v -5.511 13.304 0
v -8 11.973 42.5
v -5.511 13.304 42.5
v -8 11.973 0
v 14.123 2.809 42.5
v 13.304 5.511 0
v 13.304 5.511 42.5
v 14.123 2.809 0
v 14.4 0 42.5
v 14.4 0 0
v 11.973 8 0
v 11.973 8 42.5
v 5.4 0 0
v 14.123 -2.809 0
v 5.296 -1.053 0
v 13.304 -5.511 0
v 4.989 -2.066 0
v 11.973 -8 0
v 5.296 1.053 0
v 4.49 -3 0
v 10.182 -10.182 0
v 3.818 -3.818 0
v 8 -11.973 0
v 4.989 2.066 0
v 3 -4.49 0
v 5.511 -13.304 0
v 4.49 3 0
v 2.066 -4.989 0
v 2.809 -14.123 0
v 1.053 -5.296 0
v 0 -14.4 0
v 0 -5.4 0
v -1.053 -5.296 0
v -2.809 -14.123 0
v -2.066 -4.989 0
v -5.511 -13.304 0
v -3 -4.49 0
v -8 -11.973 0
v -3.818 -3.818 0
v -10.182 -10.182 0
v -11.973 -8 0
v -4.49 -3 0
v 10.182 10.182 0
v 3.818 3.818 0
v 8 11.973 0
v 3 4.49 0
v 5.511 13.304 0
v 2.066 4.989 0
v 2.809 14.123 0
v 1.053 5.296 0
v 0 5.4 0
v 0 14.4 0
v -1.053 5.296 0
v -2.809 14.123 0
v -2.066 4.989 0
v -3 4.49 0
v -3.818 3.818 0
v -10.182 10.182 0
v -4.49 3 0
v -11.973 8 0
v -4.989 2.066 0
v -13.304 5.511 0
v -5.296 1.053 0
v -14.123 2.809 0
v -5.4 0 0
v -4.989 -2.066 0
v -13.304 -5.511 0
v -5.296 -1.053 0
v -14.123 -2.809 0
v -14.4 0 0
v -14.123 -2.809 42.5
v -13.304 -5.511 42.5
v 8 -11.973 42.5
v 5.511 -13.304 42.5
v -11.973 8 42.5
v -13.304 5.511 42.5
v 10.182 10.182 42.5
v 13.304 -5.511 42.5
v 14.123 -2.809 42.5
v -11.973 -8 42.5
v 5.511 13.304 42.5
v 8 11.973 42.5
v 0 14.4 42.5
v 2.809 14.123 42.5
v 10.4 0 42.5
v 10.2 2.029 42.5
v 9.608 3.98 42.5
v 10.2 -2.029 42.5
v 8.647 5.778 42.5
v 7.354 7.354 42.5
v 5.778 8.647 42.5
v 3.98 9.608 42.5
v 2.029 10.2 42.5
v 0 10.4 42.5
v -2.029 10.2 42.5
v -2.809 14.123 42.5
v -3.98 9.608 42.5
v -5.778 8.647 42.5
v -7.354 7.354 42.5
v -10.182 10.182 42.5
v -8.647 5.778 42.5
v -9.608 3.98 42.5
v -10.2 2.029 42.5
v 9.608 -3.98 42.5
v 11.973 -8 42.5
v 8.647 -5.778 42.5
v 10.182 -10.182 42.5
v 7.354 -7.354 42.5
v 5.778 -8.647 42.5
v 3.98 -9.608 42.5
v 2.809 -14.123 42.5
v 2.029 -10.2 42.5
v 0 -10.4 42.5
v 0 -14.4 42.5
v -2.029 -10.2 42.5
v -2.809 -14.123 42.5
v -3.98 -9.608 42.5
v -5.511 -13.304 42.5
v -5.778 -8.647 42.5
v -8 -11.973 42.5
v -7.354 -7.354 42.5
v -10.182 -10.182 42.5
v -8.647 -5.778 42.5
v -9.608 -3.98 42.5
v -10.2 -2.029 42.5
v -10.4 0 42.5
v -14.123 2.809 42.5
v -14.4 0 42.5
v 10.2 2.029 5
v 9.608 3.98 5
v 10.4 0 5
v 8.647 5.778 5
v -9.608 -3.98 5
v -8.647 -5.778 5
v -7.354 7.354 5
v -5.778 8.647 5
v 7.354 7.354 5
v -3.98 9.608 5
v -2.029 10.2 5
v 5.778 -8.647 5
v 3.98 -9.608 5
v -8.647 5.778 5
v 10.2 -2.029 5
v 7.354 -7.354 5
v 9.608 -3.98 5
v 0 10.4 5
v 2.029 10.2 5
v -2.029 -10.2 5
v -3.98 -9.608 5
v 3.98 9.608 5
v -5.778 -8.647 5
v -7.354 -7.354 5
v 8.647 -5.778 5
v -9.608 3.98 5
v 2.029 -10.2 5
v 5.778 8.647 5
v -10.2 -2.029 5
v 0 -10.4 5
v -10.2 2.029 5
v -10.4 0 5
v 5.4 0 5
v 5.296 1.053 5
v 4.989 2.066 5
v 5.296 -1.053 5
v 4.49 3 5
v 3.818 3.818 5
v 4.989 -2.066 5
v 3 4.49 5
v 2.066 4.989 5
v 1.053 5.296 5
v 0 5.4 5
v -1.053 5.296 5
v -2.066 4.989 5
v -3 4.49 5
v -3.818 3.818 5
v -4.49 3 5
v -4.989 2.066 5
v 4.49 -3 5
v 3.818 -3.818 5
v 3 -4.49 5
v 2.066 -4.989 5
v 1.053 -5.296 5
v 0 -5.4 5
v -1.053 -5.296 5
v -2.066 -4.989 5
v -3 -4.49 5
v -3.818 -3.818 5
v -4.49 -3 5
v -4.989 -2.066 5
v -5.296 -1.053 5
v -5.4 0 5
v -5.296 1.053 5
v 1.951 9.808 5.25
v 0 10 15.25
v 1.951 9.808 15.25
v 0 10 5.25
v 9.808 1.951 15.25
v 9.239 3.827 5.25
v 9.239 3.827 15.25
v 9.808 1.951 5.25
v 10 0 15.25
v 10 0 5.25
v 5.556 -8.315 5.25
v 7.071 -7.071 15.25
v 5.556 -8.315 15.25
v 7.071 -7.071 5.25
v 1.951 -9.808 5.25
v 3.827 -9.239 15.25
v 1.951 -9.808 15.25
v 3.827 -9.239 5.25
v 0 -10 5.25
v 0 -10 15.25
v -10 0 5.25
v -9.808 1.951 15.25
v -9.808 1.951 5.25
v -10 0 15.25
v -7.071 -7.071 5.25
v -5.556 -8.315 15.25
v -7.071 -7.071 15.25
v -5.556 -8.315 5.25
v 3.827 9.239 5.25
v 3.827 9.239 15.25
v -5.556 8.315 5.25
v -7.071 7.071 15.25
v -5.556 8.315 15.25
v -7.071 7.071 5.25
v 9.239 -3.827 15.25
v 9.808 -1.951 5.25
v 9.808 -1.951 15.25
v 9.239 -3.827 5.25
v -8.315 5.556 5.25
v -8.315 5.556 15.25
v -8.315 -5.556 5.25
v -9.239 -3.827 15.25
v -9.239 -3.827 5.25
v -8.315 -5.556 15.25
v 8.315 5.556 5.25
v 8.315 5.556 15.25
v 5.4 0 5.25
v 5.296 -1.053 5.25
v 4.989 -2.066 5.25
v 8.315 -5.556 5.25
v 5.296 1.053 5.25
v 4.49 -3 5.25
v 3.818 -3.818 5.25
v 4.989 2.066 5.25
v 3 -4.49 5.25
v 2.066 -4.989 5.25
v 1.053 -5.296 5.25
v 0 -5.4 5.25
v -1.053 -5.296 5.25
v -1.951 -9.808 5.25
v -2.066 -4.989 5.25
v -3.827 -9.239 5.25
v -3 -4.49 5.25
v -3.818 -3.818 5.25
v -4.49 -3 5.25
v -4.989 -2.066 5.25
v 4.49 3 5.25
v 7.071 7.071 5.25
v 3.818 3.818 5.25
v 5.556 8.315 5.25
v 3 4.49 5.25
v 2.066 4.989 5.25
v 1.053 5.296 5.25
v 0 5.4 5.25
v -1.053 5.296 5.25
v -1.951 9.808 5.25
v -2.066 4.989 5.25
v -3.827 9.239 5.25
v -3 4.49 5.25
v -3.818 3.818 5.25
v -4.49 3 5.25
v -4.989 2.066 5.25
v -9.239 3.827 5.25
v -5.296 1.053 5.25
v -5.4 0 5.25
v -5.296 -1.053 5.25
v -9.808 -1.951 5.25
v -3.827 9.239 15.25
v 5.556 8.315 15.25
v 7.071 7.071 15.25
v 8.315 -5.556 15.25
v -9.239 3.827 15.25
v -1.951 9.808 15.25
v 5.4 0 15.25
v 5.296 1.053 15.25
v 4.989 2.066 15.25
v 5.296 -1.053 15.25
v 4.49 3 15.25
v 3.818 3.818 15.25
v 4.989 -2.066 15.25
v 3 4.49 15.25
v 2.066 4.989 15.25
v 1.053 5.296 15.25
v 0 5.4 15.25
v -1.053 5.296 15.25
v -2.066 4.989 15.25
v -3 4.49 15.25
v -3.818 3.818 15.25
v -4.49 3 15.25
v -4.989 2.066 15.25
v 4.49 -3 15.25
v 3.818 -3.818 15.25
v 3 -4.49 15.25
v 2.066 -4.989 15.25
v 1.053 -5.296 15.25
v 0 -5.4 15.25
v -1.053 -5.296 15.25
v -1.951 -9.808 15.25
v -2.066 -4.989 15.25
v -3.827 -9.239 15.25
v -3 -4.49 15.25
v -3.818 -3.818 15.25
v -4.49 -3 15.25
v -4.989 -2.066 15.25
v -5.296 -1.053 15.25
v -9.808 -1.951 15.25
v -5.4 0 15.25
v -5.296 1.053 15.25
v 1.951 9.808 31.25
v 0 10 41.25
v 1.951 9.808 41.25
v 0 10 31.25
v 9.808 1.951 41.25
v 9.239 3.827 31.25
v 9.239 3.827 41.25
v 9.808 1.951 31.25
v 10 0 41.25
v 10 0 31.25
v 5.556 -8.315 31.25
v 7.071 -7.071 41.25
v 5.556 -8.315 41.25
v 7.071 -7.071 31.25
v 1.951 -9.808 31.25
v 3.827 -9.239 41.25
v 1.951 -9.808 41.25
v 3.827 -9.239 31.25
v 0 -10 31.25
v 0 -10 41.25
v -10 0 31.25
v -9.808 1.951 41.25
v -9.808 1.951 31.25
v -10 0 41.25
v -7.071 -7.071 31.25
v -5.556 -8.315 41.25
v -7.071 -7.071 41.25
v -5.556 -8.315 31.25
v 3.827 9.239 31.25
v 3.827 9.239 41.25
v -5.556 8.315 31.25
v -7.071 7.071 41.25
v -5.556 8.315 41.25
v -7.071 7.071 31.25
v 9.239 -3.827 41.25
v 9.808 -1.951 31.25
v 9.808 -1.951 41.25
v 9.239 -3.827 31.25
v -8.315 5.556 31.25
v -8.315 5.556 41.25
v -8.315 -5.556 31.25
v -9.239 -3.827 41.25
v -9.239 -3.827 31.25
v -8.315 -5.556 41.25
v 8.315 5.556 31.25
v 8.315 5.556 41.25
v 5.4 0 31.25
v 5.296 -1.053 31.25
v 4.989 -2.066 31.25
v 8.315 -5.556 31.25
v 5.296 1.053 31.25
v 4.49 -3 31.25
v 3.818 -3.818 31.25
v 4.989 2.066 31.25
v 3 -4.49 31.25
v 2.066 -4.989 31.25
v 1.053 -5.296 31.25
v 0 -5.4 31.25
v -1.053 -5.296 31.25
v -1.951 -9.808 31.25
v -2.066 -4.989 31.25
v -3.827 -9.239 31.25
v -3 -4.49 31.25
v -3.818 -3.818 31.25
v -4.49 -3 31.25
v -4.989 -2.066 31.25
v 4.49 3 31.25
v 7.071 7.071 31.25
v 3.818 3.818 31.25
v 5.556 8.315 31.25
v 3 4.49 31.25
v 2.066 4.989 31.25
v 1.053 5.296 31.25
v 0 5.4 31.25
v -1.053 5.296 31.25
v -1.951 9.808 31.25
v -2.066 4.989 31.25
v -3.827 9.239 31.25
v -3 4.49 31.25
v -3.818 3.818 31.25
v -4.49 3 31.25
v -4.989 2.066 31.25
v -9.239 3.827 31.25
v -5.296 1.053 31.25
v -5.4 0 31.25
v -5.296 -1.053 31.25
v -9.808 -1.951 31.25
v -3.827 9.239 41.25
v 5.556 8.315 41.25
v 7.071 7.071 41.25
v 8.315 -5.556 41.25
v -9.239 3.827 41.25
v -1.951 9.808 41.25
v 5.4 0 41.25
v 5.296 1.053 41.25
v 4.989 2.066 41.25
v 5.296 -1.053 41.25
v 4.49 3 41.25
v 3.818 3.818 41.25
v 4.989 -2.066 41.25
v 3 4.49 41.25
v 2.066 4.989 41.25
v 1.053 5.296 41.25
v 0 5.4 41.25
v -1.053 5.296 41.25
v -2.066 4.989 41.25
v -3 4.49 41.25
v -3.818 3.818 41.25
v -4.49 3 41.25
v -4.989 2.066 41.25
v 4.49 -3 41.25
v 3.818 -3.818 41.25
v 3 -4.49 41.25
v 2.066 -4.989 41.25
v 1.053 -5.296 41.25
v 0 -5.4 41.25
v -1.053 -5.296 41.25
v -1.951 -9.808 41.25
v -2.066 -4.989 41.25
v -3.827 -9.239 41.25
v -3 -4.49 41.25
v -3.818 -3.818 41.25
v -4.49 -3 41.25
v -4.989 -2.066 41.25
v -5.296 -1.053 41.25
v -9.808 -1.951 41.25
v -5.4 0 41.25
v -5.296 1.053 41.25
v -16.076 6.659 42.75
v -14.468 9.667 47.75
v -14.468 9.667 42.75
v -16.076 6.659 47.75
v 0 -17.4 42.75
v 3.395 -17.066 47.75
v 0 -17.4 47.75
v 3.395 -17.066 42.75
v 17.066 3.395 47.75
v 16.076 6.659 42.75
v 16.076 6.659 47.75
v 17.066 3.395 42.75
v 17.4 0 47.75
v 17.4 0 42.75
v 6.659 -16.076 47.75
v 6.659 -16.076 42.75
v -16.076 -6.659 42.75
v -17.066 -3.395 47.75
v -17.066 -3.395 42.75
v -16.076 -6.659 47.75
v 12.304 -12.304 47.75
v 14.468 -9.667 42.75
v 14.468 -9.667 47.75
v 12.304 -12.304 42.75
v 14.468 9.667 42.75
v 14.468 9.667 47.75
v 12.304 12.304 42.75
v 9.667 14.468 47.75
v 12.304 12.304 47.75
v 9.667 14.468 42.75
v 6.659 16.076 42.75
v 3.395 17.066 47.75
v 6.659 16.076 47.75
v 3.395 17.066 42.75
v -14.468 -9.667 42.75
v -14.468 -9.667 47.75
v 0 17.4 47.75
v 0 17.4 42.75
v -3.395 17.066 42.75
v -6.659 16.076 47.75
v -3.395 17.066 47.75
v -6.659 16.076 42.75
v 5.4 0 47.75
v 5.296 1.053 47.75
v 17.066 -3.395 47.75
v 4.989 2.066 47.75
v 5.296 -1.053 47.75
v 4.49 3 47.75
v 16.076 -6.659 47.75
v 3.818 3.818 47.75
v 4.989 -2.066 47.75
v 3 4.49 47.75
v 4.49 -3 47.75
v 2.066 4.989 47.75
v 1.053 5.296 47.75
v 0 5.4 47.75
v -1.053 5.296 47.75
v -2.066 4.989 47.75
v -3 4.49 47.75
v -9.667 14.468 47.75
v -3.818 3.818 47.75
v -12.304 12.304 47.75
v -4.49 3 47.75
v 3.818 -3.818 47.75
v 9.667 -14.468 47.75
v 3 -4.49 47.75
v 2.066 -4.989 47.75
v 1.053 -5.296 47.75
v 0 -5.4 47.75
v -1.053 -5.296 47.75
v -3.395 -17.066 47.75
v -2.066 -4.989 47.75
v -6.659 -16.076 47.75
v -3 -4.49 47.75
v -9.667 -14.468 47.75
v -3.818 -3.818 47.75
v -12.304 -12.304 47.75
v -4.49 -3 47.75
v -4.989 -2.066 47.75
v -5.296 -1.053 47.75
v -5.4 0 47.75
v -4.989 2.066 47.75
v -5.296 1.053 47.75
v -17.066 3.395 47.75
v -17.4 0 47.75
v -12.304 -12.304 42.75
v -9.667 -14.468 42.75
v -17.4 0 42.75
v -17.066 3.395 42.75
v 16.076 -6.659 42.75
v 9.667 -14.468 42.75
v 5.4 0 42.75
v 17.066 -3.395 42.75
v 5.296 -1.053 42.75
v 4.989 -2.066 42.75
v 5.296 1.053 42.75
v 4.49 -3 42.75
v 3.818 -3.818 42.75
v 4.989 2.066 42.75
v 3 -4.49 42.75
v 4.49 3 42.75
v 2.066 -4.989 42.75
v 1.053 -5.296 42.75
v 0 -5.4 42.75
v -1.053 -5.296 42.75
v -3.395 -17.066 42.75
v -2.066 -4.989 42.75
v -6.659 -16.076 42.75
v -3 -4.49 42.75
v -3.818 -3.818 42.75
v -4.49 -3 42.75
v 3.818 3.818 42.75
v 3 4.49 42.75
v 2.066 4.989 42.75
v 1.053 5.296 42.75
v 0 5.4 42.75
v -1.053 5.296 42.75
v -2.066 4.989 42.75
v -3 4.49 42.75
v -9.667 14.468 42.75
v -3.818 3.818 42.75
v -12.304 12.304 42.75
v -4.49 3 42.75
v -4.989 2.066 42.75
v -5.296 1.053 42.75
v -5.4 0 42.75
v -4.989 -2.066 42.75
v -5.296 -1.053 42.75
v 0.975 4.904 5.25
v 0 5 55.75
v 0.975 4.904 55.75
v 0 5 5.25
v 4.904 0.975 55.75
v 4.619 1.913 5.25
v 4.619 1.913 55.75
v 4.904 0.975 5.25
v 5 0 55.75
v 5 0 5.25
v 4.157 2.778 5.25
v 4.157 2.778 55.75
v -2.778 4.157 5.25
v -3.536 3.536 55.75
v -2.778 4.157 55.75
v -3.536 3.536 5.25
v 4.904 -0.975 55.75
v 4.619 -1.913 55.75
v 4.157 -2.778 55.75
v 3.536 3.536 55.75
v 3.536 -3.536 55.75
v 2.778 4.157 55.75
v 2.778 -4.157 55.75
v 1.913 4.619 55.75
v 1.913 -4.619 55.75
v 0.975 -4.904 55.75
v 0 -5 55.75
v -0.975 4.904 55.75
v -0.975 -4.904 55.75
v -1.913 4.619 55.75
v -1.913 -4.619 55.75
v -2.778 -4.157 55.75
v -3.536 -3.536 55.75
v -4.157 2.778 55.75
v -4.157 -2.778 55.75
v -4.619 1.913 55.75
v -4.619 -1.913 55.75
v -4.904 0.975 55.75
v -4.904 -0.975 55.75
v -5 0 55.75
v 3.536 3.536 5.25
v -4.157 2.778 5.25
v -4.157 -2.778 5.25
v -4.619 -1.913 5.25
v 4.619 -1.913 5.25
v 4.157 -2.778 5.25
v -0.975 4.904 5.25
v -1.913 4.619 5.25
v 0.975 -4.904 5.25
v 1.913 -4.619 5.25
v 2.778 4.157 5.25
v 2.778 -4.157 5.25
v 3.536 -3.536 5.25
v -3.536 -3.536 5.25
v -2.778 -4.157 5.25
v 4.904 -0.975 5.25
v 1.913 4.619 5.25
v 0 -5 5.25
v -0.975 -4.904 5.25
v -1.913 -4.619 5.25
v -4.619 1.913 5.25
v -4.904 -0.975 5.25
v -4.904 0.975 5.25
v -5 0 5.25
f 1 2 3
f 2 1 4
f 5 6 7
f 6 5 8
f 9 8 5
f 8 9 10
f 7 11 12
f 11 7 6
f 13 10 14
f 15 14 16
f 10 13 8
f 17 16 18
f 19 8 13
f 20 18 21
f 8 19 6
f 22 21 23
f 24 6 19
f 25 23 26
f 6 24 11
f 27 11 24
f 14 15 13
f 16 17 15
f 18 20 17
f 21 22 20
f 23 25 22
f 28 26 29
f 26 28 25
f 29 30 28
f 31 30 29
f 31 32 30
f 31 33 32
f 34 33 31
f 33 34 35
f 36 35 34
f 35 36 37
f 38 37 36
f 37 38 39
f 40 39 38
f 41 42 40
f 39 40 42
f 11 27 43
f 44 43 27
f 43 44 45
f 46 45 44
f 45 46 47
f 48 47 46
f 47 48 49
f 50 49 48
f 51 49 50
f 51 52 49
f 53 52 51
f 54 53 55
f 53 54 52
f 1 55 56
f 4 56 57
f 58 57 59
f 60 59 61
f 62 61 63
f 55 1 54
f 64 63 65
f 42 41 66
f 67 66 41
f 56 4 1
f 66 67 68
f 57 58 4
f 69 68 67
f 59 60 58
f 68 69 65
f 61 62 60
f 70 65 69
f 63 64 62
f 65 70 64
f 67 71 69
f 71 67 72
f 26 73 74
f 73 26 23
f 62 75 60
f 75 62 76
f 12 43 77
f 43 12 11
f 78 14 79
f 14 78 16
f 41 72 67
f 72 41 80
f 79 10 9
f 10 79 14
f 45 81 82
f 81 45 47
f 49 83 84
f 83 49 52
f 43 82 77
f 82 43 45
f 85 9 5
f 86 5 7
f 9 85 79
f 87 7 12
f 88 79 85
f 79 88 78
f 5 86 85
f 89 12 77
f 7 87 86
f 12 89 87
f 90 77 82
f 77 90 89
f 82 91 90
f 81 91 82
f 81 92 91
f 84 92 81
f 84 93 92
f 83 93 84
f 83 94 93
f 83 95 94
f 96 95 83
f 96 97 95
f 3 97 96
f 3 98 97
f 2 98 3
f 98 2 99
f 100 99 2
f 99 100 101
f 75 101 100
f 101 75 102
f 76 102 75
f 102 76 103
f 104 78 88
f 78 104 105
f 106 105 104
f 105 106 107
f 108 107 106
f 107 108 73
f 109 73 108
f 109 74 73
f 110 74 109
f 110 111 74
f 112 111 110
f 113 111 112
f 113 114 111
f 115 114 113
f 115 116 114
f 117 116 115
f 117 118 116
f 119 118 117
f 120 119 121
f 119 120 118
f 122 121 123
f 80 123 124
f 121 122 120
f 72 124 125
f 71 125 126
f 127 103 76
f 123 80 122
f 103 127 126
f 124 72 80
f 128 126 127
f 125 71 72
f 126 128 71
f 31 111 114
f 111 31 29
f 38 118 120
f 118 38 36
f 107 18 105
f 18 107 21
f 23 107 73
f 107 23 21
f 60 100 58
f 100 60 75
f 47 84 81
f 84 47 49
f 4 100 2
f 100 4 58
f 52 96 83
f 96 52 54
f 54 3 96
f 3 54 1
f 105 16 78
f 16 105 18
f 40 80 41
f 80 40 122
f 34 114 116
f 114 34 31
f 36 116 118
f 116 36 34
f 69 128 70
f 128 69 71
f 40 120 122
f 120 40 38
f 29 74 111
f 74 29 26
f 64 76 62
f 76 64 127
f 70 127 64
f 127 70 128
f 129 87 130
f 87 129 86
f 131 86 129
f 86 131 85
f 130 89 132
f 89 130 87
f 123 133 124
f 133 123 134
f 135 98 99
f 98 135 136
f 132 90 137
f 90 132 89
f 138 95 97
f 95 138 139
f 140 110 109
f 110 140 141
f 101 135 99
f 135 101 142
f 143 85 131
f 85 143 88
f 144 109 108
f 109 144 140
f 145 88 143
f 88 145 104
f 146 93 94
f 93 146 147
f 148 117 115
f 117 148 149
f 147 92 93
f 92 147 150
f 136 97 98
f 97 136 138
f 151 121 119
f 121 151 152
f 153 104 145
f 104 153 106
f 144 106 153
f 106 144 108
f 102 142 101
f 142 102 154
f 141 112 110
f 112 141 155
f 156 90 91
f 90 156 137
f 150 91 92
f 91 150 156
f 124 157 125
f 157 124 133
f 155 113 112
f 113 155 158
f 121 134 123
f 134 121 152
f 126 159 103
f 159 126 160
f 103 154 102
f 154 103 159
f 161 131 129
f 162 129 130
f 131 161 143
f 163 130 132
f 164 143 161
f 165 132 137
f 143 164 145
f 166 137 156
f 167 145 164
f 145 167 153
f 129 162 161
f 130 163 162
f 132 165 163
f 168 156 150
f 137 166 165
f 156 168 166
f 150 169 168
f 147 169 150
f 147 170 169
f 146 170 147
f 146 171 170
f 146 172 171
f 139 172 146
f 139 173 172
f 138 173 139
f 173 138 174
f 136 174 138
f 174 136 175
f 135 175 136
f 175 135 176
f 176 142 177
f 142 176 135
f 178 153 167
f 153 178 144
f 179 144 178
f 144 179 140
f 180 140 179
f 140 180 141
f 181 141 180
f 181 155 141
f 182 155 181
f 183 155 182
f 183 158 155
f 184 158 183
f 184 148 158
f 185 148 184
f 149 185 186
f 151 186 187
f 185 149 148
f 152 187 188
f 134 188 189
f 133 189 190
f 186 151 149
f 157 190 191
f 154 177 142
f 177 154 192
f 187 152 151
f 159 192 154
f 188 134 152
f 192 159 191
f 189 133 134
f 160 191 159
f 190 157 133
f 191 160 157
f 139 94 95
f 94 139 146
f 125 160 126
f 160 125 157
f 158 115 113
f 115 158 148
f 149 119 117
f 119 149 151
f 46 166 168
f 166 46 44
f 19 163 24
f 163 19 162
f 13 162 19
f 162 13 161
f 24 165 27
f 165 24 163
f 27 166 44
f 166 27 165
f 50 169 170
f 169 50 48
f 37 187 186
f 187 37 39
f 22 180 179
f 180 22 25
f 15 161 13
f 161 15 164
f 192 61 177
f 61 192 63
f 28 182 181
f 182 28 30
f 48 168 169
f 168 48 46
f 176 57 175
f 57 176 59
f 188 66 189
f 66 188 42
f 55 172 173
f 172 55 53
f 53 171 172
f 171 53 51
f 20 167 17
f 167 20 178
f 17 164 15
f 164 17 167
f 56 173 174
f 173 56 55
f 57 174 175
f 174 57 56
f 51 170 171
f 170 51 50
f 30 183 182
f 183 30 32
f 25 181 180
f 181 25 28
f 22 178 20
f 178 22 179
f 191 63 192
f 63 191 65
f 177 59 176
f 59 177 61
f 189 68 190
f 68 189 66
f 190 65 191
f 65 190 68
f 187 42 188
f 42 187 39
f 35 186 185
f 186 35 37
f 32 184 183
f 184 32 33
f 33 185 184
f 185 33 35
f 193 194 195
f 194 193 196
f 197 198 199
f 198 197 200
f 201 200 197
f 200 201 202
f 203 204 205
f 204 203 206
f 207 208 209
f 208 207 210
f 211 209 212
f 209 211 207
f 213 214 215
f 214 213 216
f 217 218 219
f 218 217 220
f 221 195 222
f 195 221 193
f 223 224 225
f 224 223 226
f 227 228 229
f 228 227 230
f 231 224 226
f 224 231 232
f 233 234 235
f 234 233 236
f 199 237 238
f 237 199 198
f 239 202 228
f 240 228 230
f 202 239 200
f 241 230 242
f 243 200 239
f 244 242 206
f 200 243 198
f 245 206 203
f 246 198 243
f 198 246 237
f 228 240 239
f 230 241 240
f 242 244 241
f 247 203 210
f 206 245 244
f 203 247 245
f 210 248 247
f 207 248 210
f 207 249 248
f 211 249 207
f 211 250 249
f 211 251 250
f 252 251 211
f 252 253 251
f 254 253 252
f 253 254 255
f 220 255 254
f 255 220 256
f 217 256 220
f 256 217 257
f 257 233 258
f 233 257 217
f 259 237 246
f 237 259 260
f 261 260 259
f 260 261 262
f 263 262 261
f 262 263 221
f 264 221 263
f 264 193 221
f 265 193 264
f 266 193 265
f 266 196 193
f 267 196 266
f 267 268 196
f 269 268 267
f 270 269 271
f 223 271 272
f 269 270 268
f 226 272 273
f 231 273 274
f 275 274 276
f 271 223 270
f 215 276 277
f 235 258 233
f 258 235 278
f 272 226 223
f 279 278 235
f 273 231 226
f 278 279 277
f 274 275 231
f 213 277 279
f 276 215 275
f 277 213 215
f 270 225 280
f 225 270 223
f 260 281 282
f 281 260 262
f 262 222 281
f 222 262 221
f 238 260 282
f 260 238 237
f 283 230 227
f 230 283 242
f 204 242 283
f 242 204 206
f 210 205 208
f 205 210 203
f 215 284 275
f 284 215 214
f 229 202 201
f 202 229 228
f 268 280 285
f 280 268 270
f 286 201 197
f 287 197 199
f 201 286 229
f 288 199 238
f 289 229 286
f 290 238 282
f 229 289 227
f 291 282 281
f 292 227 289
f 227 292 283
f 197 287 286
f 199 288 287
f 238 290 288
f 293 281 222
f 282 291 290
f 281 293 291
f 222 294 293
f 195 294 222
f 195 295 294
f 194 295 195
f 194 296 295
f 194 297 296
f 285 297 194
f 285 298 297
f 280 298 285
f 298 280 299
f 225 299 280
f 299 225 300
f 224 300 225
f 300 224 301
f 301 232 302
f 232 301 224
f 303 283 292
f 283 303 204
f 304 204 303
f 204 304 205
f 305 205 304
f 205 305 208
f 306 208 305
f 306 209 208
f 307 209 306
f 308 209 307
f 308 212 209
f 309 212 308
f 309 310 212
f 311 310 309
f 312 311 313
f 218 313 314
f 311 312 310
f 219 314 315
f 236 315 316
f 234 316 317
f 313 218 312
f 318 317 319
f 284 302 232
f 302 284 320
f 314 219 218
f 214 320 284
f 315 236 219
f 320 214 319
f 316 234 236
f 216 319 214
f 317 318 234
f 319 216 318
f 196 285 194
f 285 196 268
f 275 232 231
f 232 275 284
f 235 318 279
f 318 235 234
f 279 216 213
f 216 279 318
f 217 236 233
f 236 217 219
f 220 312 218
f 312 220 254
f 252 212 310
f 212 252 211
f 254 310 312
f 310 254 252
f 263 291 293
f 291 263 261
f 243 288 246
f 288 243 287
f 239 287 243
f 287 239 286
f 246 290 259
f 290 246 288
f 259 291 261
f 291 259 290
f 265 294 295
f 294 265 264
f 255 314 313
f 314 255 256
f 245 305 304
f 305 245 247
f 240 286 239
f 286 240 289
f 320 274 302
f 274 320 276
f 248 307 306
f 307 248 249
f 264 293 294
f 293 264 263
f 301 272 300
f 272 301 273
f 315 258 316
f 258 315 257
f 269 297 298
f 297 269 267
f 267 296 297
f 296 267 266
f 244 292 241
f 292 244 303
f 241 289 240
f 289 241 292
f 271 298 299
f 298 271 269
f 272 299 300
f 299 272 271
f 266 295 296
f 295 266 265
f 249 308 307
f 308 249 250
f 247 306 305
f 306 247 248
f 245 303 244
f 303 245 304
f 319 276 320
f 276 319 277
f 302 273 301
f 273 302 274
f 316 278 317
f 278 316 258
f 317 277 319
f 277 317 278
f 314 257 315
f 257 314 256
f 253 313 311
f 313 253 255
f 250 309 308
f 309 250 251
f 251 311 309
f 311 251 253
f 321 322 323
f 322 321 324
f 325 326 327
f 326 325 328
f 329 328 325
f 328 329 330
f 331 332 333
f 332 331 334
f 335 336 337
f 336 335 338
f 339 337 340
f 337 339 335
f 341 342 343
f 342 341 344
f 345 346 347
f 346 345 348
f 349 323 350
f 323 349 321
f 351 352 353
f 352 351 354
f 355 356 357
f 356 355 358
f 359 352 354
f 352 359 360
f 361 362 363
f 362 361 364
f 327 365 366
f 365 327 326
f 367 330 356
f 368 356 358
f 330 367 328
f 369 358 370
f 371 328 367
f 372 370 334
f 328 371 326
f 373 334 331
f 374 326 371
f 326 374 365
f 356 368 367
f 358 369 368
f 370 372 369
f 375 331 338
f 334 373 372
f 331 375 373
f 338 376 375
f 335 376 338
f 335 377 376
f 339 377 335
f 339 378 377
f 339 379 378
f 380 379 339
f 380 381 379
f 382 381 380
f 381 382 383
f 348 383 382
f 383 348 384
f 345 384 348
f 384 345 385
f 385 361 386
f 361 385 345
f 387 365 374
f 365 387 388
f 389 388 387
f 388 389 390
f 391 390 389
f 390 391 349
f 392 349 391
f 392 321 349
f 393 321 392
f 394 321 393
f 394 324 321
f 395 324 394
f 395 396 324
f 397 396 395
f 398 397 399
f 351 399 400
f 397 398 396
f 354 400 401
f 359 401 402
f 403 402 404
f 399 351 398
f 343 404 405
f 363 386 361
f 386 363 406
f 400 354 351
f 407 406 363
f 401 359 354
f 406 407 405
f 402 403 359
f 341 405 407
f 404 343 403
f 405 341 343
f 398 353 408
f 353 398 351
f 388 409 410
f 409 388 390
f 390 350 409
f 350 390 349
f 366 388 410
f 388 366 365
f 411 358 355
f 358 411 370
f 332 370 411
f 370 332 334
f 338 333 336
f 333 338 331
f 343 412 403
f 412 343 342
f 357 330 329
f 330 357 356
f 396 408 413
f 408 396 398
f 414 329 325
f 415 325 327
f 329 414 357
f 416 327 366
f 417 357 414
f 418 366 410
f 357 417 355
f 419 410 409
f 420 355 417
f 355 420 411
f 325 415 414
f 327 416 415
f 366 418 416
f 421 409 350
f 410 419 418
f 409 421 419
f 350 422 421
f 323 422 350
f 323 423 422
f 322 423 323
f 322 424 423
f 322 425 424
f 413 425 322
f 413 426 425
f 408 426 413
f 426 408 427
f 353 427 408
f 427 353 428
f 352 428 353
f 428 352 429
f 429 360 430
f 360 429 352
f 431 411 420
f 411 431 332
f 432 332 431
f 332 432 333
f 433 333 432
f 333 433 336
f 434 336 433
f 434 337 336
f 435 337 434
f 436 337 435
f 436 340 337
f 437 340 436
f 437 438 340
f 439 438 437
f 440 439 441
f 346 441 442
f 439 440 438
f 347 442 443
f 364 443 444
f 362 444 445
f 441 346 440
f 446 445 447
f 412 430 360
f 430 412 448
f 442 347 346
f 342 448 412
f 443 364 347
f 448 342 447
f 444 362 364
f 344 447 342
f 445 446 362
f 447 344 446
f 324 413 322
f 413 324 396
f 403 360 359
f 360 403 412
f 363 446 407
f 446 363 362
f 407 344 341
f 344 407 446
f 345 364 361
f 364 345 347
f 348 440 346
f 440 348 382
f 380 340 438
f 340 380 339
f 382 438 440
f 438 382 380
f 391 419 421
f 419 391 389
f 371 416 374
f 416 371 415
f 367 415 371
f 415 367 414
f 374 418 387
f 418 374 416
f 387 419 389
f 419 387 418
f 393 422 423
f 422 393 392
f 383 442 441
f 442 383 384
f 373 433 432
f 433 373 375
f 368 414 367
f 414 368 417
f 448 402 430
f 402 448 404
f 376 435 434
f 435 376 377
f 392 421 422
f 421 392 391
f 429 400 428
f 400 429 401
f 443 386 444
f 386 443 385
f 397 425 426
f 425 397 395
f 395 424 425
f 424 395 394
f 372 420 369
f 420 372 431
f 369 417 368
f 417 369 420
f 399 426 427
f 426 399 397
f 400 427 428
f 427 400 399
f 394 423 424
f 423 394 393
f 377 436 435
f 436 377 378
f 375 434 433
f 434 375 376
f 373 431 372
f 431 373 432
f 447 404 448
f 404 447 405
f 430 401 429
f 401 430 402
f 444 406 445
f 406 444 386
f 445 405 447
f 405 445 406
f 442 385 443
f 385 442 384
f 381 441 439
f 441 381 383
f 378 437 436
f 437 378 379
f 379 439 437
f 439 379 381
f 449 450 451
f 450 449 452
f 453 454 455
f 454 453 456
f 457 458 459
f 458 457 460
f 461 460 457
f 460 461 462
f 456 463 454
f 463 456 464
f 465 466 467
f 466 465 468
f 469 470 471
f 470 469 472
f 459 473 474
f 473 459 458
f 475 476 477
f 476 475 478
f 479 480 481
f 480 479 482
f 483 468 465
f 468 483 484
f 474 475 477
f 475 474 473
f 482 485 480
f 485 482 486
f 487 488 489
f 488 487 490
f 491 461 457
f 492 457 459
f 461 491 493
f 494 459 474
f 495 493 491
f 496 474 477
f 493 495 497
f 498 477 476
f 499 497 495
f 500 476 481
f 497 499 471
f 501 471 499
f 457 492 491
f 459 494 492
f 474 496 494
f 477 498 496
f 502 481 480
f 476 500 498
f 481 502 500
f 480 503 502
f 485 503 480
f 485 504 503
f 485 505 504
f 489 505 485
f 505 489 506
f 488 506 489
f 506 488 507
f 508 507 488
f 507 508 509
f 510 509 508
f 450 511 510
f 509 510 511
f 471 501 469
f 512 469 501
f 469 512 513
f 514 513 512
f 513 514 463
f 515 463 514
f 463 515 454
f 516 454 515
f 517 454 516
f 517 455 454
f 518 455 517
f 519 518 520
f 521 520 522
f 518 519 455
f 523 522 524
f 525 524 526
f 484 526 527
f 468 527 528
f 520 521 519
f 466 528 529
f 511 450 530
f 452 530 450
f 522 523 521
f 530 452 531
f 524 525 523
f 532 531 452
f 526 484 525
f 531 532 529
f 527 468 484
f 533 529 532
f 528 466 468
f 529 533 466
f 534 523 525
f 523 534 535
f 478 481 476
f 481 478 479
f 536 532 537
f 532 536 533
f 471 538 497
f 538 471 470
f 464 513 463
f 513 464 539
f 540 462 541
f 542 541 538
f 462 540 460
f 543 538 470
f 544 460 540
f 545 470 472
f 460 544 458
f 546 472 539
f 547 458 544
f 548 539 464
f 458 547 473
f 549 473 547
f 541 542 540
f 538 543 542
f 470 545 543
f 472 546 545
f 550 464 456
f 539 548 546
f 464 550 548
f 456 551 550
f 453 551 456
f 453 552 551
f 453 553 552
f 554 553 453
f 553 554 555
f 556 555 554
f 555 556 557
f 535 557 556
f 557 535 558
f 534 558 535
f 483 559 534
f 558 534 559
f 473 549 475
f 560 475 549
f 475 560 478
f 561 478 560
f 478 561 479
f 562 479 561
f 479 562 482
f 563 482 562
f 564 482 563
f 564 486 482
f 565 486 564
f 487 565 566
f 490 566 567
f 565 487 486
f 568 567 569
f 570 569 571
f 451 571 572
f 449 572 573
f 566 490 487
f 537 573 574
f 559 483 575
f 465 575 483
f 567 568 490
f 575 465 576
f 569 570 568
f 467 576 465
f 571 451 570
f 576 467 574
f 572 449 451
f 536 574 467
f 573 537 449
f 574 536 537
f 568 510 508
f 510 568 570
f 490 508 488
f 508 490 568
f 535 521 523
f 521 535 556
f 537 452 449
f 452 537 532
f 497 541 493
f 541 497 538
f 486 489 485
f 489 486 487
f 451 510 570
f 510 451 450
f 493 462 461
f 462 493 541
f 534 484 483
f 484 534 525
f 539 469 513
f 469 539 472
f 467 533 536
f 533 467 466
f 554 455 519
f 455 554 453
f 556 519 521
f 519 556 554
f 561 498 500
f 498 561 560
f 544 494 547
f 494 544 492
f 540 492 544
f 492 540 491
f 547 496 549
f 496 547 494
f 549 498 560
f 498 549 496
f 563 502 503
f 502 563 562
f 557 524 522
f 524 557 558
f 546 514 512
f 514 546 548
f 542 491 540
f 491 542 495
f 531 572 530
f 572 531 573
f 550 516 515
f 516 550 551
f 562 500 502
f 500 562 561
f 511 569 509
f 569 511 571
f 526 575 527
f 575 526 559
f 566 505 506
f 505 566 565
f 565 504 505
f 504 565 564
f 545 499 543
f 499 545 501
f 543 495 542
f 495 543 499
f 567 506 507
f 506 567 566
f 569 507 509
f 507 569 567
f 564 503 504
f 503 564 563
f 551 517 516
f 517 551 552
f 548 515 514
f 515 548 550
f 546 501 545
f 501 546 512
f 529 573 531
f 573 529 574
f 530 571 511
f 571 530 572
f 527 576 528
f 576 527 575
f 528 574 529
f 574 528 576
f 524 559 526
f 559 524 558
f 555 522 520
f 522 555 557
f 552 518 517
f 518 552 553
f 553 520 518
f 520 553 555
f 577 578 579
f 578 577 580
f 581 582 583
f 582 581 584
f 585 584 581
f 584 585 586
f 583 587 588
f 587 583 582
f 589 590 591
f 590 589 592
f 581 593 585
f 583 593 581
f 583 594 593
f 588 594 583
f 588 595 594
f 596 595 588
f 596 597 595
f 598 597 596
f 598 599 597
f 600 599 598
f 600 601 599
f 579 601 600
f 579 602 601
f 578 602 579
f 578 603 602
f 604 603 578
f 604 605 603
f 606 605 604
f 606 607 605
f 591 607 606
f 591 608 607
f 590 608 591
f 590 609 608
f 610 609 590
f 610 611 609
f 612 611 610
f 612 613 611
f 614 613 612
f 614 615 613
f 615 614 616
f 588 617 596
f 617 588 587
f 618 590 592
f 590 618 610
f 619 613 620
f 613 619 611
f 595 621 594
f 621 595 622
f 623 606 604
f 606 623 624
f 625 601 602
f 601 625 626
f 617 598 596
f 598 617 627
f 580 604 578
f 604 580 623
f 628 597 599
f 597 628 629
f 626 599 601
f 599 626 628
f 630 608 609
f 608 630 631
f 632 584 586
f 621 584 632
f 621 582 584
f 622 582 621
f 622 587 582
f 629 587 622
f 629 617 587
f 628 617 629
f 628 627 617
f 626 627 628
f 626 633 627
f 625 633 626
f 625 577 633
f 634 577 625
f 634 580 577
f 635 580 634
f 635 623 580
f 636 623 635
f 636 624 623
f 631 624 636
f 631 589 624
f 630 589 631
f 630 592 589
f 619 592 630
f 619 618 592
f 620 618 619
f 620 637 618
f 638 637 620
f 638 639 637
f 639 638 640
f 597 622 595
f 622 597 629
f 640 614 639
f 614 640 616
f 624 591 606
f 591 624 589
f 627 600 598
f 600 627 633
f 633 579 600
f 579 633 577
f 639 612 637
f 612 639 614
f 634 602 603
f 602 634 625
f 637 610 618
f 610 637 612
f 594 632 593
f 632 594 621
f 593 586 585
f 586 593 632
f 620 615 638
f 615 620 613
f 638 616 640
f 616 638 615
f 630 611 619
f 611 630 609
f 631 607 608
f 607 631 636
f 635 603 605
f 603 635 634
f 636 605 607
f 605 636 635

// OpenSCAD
$fn = 32;

// ------------------------------------------------------------------------
// Shaft station: cup d28.8 x 42.5 mm, shaft d10
// Every part is its own module, assembly() places every instance.
// ------------------------------------------------------------------------

// --- part 1 ---
module housing_cup() {
  difference() {
    cylinder(h = 42.5, d = 28.8);
    translate([0, 0, 5]) cylinder(h = 38.5, d = 20.8);
    translate([0, 0, -1]) cylinder(h = 7, d = 10.8);
  }
}

// --- part 2 ---
module bearing_lower() {
  difference() {
      translate([0, 0, 0]) cylinder(h = 10, d = 20);
      translate([0, 0, -1]) cylinder(h = 12, d = 10.8);
    }
}

// --- part 3 ---
module bearing_upper() {
  difference() {
      translate([0, 0, 0]) cylinder(h = 10, d = 20);
      translate([0, 0, -1]) cylinder(h = 12, d = 10.8);
    }
}

// --- part 4 ---
module station_shaft() {
  translate([0, 0, -25.25]) cylinder(h = 50.5, d = 10);
}

// --- part 5 ---
module station_cover() {
  difference() {
    cylinder(h = 5, d = 34.8);
    translate([0, 0, -1]) cylinder(h = 7, d = 10.8);
  }
}

// --- assembly ---
module assembly() {
  color([0.80, 0.24, 0.20]) translate([0, 0, 0]) rotate([0, 0, 0]) housing_cup();
  color([0.20, 0.45, 0.75]) translate([0, 0, 5.25]) rotate([0, 0, 0]) bearing_lower();
  color([0.25, 0.62, 0.32]) translate([0, 0, 31.25]) rotate([0, 0, 0]) bearing_upper();
  color([0.92, 0.70, 0.18]) translate([0, 0, 30.5]) rotate([0, 0, 0]) station_shaft();
  color([0.58, 0.35, 0.70]) translate([0, 0, 42.75]) rotate([0, 0, 0]) station_cover();
}

assembly();
